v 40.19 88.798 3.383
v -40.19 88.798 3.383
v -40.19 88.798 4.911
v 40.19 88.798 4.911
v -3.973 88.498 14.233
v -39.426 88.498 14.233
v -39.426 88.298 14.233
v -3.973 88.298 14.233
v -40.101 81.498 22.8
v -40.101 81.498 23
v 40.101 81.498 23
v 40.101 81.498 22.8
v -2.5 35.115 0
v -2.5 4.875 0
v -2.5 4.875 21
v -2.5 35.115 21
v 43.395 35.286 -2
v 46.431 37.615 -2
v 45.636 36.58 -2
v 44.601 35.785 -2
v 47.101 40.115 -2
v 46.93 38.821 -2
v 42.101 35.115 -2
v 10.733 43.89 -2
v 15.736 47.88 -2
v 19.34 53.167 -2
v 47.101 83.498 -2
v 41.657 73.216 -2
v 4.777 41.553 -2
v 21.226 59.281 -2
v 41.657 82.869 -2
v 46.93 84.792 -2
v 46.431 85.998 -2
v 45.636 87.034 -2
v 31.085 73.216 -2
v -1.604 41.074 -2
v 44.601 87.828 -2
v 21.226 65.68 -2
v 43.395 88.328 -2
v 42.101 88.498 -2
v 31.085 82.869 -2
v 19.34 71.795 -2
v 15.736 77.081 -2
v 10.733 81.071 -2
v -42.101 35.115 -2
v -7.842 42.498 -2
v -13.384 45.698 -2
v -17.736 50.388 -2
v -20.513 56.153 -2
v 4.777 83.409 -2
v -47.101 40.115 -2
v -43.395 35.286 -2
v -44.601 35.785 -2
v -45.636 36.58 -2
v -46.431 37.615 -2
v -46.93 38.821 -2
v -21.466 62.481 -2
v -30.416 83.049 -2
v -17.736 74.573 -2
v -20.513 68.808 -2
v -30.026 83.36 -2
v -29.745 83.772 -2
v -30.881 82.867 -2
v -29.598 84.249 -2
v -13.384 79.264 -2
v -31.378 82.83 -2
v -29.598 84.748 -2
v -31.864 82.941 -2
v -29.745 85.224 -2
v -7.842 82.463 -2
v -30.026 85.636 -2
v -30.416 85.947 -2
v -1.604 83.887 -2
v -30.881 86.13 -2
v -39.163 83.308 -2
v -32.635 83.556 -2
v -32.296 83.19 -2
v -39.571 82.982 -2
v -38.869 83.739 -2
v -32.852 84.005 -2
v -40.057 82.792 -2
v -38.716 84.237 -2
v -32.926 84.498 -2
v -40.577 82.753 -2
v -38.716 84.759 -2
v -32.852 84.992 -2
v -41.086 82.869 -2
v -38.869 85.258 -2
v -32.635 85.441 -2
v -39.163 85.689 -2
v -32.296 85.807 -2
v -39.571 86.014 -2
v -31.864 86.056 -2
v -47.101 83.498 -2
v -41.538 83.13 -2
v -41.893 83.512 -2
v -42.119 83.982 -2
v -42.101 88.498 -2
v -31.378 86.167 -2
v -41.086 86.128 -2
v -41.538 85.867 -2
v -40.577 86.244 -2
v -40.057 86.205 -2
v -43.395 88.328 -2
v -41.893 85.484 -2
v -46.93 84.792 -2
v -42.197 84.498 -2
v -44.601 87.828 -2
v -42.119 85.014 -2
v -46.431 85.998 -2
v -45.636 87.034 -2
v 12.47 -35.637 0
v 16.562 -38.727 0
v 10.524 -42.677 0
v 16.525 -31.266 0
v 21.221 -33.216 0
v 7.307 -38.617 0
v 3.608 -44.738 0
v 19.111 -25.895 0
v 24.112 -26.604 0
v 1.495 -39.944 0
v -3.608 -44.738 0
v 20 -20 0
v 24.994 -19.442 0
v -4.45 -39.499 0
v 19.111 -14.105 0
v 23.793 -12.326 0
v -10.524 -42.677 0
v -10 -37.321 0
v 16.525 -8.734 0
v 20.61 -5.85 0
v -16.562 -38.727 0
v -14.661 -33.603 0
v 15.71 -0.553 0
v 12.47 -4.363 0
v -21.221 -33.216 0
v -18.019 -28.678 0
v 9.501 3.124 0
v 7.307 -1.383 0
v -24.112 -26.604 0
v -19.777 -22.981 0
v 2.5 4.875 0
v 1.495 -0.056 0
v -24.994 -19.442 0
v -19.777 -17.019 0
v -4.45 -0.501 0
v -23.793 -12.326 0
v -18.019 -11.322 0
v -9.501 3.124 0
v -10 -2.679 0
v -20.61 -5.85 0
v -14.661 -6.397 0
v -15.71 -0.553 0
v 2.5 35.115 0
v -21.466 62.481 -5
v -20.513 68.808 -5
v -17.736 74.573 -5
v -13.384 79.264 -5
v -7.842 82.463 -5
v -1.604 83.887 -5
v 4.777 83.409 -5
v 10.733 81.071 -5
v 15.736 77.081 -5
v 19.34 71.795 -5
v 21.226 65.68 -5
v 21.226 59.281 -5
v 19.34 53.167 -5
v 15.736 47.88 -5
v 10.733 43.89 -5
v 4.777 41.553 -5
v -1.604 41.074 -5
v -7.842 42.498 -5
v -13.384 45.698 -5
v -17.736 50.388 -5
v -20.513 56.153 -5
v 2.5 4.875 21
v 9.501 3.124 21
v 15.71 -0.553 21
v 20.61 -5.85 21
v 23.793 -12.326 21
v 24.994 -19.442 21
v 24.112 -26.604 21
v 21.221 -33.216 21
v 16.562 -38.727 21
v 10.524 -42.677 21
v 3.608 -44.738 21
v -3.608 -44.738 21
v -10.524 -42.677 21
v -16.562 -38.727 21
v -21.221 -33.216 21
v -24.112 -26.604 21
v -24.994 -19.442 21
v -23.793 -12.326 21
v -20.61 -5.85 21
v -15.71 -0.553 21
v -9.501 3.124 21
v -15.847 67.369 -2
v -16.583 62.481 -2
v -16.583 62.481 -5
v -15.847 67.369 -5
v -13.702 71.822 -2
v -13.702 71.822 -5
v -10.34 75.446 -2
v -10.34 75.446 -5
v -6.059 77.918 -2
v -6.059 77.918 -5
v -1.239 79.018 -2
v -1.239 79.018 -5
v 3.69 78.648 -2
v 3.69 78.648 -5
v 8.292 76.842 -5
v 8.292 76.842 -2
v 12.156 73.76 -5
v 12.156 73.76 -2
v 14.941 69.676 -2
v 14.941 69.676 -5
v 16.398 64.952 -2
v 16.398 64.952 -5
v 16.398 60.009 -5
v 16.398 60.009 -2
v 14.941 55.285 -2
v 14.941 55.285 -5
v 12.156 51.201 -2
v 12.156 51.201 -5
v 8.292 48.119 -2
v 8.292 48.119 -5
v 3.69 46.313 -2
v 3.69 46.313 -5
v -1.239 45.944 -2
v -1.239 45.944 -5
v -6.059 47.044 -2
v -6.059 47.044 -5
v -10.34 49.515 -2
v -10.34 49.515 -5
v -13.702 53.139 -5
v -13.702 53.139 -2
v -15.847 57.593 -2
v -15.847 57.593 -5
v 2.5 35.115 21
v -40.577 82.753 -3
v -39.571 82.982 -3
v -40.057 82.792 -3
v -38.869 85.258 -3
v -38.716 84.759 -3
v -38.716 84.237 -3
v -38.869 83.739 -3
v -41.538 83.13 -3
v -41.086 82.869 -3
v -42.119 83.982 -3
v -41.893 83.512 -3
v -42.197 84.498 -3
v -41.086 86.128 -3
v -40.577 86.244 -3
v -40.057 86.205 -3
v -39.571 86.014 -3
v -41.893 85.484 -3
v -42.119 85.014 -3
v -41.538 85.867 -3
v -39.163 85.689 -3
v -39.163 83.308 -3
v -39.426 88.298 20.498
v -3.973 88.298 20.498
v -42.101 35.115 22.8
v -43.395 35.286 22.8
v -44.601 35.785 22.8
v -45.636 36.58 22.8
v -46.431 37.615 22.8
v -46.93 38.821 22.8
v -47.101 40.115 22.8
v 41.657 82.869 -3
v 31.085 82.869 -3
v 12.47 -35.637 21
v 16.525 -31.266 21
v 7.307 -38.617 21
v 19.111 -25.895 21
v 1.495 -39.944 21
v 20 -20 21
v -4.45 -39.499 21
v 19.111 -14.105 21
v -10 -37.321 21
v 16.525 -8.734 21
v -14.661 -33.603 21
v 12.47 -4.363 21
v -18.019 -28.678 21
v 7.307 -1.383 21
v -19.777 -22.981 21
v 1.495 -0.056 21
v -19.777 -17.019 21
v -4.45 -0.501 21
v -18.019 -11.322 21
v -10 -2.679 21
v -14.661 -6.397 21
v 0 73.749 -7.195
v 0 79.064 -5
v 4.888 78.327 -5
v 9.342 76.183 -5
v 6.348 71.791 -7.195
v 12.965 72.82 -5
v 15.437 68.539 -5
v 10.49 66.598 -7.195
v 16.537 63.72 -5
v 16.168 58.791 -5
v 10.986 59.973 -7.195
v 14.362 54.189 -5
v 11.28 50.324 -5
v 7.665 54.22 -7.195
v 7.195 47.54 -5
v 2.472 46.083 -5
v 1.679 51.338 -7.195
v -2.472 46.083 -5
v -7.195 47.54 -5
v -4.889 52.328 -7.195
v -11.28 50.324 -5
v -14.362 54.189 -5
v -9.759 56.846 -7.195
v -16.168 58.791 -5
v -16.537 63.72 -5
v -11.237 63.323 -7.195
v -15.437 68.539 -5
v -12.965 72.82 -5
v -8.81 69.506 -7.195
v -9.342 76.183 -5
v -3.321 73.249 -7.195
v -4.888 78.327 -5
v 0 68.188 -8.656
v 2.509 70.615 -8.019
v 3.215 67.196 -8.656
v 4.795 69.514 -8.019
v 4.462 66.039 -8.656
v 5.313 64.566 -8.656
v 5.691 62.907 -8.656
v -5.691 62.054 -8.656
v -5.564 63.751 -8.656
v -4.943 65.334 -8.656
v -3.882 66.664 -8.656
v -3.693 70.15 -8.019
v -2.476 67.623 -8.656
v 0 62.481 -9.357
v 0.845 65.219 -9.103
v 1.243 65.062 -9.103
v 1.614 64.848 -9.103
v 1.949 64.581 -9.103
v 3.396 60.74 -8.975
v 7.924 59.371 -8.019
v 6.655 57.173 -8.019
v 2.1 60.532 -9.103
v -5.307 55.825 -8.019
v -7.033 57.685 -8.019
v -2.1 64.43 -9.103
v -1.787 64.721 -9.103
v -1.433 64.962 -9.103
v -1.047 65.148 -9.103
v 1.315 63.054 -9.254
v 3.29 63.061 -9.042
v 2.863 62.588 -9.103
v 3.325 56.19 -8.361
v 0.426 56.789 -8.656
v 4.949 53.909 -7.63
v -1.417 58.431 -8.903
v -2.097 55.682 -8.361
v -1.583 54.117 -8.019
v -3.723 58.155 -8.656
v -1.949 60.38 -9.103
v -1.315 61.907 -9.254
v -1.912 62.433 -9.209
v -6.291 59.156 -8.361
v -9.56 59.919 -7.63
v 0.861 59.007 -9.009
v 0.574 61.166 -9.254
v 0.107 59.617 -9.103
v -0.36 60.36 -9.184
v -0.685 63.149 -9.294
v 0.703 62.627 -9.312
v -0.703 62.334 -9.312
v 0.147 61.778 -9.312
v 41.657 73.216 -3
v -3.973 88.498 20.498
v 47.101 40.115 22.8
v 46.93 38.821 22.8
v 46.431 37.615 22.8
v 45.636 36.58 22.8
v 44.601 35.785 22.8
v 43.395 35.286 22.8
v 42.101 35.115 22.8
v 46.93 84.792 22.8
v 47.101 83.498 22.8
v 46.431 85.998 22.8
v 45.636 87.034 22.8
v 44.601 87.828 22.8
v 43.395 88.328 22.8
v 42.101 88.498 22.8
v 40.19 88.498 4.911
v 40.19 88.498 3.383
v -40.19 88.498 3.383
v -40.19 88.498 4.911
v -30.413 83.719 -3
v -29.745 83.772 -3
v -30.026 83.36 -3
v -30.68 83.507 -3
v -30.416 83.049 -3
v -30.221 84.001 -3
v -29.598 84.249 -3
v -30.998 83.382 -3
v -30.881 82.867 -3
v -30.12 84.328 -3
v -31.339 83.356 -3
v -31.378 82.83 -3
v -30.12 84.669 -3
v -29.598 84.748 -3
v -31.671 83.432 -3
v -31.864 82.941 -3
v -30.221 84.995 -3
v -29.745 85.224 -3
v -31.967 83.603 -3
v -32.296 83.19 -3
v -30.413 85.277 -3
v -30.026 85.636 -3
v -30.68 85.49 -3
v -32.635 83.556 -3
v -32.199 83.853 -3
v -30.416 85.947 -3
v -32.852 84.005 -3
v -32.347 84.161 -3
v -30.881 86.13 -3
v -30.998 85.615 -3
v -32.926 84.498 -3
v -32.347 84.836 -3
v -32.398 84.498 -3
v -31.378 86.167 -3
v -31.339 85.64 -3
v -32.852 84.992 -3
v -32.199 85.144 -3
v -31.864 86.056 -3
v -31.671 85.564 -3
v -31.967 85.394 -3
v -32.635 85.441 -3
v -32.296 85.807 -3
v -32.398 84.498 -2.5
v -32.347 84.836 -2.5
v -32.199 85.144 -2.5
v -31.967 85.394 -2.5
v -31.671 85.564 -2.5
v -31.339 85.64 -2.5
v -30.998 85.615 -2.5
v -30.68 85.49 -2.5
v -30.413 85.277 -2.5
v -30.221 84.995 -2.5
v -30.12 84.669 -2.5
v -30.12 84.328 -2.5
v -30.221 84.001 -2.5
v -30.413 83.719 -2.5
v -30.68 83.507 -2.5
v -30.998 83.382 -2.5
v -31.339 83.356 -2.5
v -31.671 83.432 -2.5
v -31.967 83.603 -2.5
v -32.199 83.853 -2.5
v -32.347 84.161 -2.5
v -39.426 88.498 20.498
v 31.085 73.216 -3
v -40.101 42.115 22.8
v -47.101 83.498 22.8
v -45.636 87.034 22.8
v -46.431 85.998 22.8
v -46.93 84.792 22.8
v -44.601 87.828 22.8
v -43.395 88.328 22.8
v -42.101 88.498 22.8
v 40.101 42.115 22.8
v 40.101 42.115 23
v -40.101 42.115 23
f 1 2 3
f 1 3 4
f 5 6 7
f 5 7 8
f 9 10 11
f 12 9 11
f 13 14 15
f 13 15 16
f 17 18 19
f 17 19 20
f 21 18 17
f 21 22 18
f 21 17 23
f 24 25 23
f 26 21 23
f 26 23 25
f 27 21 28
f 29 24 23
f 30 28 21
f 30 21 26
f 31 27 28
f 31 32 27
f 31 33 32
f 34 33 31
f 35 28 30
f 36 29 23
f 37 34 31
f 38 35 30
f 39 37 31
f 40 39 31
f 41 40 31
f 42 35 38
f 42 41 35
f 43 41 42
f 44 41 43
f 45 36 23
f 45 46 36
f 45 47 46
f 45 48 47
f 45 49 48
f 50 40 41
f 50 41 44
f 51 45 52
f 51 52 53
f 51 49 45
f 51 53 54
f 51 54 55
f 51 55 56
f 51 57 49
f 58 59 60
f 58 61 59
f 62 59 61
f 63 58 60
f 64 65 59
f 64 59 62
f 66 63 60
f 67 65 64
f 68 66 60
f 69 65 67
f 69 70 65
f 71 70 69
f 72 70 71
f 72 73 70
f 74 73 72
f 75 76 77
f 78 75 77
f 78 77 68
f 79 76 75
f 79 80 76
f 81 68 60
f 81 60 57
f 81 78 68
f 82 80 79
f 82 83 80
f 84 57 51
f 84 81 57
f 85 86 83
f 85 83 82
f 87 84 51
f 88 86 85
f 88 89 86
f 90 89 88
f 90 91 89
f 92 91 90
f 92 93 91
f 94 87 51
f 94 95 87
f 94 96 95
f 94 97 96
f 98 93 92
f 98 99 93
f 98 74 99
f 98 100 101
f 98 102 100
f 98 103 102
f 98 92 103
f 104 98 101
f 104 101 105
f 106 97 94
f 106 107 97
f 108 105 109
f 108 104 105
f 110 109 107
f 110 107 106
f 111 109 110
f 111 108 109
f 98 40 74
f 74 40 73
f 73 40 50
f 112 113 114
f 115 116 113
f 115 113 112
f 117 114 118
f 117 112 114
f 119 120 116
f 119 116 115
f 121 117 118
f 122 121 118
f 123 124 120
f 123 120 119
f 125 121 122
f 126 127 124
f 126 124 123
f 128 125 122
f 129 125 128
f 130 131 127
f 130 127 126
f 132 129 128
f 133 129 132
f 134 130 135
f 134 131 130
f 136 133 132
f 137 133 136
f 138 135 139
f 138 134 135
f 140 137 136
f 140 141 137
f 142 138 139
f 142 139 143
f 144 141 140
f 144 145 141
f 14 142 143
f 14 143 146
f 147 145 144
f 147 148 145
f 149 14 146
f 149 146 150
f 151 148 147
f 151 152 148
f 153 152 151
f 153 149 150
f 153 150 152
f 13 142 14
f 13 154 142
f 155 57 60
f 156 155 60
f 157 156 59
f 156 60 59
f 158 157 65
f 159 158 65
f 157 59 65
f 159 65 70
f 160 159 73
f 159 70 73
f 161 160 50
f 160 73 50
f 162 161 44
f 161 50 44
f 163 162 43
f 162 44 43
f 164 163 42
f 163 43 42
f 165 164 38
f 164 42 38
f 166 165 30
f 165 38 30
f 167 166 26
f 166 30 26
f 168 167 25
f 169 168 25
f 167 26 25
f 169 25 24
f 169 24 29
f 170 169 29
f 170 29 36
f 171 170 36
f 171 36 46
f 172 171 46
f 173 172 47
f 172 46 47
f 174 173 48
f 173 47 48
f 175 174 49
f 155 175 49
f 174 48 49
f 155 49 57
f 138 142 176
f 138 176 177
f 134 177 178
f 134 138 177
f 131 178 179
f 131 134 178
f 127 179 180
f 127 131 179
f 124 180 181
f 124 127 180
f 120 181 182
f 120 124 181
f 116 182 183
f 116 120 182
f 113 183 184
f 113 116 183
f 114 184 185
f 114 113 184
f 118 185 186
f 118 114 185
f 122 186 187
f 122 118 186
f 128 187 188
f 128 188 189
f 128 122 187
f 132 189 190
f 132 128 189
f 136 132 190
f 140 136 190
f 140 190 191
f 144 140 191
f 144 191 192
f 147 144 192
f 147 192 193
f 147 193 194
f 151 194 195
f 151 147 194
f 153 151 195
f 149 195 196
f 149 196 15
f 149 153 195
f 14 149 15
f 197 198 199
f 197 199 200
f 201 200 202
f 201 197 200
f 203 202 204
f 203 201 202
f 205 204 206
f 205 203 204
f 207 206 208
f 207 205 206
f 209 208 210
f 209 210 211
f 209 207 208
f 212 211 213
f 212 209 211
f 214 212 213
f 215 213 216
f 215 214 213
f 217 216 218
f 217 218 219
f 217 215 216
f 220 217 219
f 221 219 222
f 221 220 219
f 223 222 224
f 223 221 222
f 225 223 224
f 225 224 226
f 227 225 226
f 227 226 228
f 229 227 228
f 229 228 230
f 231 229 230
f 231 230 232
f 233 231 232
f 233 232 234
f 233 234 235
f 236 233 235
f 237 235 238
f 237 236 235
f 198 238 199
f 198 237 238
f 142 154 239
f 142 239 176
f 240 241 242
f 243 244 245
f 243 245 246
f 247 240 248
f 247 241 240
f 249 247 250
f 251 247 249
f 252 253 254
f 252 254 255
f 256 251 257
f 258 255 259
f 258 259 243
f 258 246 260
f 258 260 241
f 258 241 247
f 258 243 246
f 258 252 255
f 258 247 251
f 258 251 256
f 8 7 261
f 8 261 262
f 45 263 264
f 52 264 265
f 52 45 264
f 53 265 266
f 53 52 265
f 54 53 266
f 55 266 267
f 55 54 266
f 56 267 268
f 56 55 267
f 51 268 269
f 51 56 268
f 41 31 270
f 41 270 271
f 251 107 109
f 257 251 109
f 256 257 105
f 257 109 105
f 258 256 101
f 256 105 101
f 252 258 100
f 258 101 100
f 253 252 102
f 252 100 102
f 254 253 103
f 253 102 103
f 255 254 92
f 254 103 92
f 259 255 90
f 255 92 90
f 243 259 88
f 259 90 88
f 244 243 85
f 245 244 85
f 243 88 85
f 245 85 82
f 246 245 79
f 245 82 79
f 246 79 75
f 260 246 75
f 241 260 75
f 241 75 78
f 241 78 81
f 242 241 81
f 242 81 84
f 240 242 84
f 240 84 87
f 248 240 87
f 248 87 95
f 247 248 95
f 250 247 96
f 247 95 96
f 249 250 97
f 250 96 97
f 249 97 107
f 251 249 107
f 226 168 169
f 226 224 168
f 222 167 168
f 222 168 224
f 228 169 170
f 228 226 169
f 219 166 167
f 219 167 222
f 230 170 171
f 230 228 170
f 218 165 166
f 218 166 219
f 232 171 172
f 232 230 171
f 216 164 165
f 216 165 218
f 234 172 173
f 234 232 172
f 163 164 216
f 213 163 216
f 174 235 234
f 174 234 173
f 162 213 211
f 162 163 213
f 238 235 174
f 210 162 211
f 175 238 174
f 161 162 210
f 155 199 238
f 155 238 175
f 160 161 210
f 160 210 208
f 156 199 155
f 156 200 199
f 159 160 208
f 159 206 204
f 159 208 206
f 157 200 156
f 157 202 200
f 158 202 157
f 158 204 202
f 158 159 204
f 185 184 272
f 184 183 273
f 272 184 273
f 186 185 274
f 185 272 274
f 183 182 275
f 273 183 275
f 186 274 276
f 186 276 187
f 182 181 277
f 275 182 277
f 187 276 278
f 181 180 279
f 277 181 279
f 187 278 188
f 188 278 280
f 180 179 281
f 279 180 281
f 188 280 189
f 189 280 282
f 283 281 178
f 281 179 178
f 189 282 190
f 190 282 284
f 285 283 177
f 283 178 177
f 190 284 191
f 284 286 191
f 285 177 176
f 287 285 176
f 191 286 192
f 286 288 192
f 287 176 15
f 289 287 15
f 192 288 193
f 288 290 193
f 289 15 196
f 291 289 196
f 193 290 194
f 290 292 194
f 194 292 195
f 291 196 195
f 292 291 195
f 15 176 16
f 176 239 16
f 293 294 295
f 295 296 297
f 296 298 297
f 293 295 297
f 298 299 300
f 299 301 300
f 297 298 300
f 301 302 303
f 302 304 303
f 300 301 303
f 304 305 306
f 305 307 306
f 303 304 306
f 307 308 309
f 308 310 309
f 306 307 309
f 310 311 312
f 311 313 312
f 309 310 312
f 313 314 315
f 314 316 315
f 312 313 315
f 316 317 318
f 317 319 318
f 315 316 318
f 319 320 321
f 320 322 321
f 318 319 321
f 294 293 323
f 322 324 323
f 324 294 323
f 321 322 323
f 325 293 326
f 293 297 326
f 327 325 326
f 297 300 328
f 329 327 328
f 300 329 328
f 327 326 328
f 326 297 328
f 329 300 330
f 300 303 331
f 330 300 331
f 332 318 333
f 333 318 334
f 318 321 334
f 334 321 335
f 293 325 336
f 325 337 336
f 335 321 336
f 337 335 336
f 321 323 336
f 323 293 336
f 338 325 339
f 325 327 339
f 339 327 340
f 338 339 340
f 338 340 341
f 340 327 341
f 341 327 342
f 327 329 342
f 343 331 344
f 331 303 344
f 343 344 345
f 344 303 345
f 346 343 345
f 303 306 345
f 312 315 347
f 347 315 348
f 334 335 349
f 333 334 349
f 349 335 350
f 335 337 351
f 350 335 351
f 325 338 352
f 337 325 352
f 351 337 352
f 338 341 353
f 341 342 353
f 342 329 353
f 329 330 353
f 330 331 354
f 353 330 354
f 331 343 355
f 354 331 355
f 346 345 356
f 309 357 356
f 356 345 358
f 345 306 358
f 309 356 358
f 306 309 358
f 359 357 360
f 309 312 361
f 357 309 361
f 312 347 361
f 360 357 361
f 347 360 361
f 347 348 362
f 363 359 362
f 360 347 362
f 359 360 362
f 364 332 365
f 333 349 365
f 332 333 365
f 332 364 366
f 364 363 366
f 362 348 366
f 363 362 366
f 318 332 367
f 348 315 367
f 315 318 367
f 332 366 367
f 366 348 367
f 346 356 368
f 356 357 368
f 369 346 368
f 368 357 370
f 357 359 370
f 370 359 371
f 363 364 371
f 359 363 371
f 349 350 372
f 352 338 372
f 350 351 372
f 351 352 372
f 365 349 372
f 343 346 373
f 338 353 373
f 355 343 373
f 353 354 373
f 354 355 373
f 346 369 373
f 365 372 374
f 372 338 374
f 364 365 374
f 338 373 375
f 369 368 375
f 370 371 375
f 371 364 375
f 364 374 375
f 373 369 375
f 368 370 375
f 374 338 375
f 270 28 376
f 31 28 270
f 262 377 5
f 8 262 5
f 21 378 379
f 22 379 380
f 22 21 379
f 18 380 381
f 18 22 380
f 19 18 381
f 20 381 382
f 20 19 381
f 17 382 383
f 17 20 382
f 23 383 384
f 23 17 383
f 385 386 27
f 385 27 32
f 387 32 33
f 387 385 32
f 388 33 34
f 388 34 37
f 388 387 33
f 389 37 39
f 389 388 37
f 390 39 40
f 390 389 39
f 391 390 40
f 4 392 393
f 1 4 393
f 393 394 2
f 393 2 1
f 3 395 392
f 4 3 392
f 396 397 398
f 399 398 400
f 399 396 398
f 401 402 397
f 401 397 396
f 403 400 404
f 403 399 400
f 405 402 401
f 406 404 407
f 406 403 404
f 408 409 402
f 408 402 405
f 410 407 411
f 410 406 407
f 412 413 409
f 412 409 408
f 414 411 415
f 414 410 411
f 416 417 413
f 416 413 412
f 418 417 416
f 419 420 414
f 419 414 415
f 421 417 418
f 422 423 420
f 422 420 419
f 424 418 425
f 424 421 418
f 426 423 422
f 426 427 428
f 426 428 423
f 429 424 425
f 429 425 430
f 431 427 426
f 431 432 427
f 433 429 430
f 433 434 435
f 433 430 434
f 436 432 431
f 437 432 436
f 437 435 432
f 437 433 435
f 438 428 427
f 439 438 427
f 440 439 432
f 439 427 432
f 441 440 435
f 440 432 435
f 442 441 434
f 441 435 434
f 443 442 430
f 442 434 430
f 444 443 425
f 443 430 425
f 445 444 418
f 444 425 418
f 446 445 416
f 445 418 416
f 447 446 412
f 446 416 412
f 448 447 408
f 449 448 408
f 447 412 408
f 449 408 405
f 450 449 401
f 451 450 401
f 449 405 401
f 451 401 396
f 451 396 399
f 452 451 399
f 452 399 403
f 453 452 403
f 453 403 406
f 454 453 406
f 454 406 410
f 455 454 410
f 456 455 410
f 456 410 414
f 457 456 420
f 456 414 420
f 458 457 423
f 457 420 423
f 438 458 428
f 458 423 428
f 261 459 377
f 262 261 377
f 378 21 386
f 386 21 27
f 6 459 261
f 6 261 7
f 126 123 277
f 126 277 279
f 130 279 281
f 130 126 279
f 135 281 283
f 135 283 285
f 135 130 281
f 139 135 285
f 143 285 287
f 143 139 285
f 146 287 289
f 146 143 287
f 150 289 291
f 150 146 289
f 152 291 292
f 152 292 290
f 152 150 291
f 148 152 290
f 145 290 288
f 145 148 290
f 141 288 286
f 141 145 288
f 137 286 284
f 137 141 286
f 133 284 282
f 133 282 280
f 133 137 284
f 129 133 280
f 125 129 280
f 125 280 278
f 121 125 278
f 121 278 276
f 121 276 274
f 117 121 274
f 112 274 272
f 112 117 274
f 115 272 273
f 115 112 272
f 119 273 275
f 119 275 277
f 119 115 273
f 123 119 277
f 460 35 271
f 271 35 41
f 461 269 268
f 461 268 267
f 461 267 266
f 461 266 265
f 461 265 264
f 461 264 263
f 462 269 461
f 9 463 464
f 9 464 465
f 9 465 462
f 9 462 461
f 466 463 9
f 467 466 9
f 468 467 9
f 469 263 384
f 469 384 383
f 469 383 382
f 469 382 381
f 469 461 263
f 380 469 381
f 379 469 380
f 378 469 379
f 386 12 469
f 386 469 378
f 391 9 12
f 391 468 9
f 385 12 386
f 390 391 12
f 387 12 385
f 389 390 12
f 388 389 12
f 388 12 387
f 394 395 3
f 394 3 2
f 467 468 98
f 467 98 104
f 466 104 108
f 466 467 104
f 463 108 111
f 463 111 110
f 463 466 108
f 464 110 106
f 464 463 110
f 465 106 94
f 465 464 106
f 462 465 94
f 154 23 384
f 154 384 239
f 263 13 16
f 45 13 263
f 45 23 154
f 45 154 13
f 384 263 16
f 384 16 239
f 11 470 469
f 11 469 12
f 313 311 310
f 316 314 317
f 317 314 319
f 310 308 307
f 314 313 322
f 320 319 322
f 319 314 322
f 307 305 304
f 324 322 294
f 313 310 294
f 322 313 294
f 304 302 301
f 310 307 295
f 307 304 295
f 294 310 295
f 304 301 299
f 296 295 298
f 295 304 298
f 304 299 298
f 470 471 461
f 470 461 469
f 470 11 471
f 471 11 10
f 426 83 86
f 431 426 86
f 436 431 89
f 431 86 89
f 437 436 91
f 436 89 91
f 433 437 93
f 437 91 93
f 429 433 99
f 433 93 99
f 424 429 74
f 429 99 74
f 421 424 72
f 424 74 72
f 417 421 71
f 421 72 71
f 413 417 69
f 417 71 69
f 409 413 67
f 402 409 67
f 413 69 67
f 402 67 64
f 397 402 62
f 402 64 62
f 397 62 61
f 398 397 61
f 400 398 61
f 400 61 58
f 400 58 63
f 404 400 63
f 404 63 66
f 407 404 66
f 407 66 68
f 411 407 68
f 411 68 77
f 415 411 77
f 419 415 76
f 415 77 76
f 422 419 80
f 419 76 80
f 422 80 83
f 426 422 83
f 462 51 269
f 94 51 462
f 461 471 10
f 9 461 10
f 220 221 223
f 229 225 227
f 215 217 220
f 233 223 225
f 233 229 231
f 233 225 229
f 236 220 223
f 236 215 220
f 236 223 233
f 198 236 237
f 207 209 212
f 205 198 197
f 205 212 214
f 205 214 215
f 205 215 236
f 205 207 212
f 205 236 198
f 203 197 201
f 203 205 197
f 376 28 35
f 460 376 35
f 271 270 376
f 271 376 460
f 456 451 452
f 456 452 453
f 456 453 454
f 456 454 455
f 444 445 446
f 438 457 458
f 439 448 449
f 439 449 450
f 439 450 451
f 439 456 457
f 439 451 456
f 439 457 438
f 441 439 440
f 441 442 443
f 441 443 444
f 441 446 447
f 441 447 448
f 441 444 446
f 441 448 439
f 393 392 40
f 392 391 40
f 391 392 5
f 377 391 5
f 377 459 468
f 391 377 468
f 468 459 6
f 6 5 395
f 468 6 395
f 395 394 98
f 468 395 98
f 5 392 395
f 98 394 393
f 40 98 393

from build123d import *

# Parameters (mm, degrees)
SKETCH1_R                = 20
BOSS_EXTRUDE1_DEPTH      = 21
SKETCH2_W                = 94.201321488
SKETCH2_H                = 53.383054243
BOSS_EXTRUDE2_DEPTH      = 2
BOSS_EXTRUDE2_DEPTH_BACK = 23
SKETCH3_R                = 21.466238287
SKETCH3_R_2              = 16.583389224
BOSS_EXTRUDE3_DEPTH      = 3
SKETCH5_R                = 1.673213121
SKETCH5_R_2              = 1.750359772
SKETCH5_W                = 10.5723409
SKETCH5_H                = 9.65300691
BOSS_EXTRUDE4_DEPTH      = 1
SKETCH6_R                = 1.145286075
CUT_EXTRUDE1_DEPTH       = 0.5
FILLET1_R                = 5
SKETCH7_W                = 80.380422704
SKETCH7_H                = 1.528144919
BOSS_EXTRUDE5_DEPTH      = 0.3
SKETCH8_W                = 35.452962105
SKETCH8_H                = 6.265394165
CUT_EXTRUDE2_DEPTH       = 0.2
SKETCH9_W                = 80.201321488
SKETCH9_H                = 39.383054243
CUT_EXTRUDE3_DEPTH       = 0.2


with BuildPart() as part:
    # Sketch1 → Boss-Extrude1 (new body)
    with BuildSketch(Plane.XY):
        with BuildLine():
            Line((-2.5, 4.874685928), (-2.5, 35.297974782))
            Line((-2.5, 35.297974782), (2.5, 35.297974782))
            Line((2.5, 35.297974782), (2.5, 4.874685928))
            ThreePointArc((2.5, 4.874685928), (0, -45), (-2.5, 4.874685928))
        make_face()
        with Locations((0, -20)):
            Circle(SKETCH1_R, mode=Mode.SUBTRACT)
    extrude(amount=BOSS_EXTRUDE1_DEPTH)

    # Sketch2 → Boss-Extrude2 (add, two sides)
    with BuildSketch(Plane(origin=(0, 0, 0), x_dir=(-1, 0, 0), z_dir=(0, 0, -1))) as boss_extrude2_sk:
        with Locations((0, 61.80682757)):
            Rectangle(SKETCH2_W, SKETCH2_H)
    extrude(amount=BOSS_EXTRUDE2_DEPTH)
    extrude(boss_extrude2_sk.sketch, amount=-BOSS_EXTRUDE2_DEPTH_BACK)

    # Sketch3 → Boss-Extrude3 (add)
    with BuildSketch(Plane(origin=(0, 0, -2), x_dir=(-1, 0, 0), z_dir=(0, 0, -1))):
        with Locations((0, 62.480667846)):
            Circle(SKETCH3_R)
        with Locations((0, 62.480667846)):
            Circle(SKETCH3_R_2, mode=Mode.SUBTRACT)
    extrude(amount=BOSS_EXTRUDE3_DEPTH)

    # Sketch5 → Boss-Extrude4 (add)
    with BuildSketch(Plane(origin=(0, 0, -2), x_dir=(-1, 0, 0), z_dir=(0, 0, -1))):
        with Locations((31.252984021, 84.498349336)):
            Circle(SKETCH5_R)
        with Locations((40.446323934, 84.498349336)):
            Circle(SKETCH5_R_2)
        with Locations((-36.370926049, 78.042958424)):
            Rectangle(SKETCH5_W, SKETCH5_H)
    extrude(amount=BOSS_EXTRUDE4_DEPTH)

    # Sketch6 → Cut-Extrude1 (cut)
    with BuildSketch(Plane(origin=(0, 0, -3), x_dir=(-1, 0, 0), z_dir=(0, 0, -1))):
        with Locations((31.252984021, 84.498349336)):
            Circle(SKETCH6_R)
    extrude(amount=-CUT_EXTRUDE1_DEPTH, mode=Mode.SUBTRACT)

    # Fillet1
    fillet1_edges = [part.edges().sort_by_distance(p)[0] for p in [
        (47.100660744, 35.115300448, 10.5),
        (-47.100660744, 35.115300448, 10.5),
        (-47.100660744, 88.498354691, 10.5),
        (47.100660744, 88.498354691, 10.5),
    ]]
    fillet(fillet1_edges, radius=FILLET1_R)

    # Sketch7 → Boss-Extrude5 (add)
    with BuildSketch(Plane(origin=(0, 88.498354691, 0), x_dir=(1, 0, 0), z_dir=(0, 1, 0))):
        with Locations((0, -4.147120871)):
            Rectangle(SKETCH7_W, SKETCH7_H)
    extrude(amount=BOSS_EXTRUDE5_DEPTH)

    # Sketch8 → Cut-Extrude2 (cut)
    with BuildSketch(Plane(origin=(0, 88.498354691, 0), x_dir=(1, 0, 0), z_dir=(0, 1, 0))):
        with Locations((-21.699657841, -17.365574415)):
            Rectangle(SKETCH8_W, SKETCH8_H)
    extrude(amount=-CUT_EXTRUDE2_DEPTH, mode=Mode.SUBTRACT)

    # Sketch9 → Cut-Extrude3 (cut)
    with BuildSketch(Plane.XY.offset(23)):
        with BuildLine():
            Line((-47.100660744, 83.498354691), (-47.100660744, 40.115300448))
            ThreePointArc((-47.100660744, 40.115300448), (-45.63619465, 36.579766542), (-42.100660744, 35.115300448))
            Line((-42.100660744, 35.115300448), (42.100660744, 35.115300448))
            ThreePointArc((42.100660744, 35.115300448), (45.63619465, 36.579766542), (47.100660744, 40.115300448))
            Line((47.100660744, 40.115300448), (47.100660744, 83.498354691))
            ThreePointArc((47.100660744, 83.498354691), (45.63619465, 87.033888597), (42.100660744, 88.498354691))
            Line((42.100660744, 88.498354691), (-42.100660744, 88.498354691))
            ThreePointArc((-42.100660744, 88.498354691), (-45.63619465, 87.033888597), (-47.100660744, 83.498354691))
        make_face()
        with Locations((0, 61.80682757)):
            Rectangle(SKETCH9_W, SKETCH9_H, mode=Mode.SUBTRACT)
    extrude(amount=-CUT_EXTRUDE3_DEPTH, mode=Mode.SUBTRACT)


with BuildPart() as body_2:
    # Sketch4 → Revolve2 (revolve)
    with BuildSketch(Plane(origin=(0, 0, 0), x_dir=(0, 0, -1), z_dir=(1, 0, 0))):
        with BuildLine():
            Line((5, 79.06405707), (5, 62.480667846))
            Line((5, 62.480667846), (9.357251045, 62.480667846))
            ThreePointArc((9.357251045, 62.480667846), (8.01892353, 70.993149013), (5, 79.06405707))
        make_face()
    revolve(axis=Axis((0, 62.480667846, -5), (0, 0, -1)))


solid = Compound([part.part, body_2.part])
